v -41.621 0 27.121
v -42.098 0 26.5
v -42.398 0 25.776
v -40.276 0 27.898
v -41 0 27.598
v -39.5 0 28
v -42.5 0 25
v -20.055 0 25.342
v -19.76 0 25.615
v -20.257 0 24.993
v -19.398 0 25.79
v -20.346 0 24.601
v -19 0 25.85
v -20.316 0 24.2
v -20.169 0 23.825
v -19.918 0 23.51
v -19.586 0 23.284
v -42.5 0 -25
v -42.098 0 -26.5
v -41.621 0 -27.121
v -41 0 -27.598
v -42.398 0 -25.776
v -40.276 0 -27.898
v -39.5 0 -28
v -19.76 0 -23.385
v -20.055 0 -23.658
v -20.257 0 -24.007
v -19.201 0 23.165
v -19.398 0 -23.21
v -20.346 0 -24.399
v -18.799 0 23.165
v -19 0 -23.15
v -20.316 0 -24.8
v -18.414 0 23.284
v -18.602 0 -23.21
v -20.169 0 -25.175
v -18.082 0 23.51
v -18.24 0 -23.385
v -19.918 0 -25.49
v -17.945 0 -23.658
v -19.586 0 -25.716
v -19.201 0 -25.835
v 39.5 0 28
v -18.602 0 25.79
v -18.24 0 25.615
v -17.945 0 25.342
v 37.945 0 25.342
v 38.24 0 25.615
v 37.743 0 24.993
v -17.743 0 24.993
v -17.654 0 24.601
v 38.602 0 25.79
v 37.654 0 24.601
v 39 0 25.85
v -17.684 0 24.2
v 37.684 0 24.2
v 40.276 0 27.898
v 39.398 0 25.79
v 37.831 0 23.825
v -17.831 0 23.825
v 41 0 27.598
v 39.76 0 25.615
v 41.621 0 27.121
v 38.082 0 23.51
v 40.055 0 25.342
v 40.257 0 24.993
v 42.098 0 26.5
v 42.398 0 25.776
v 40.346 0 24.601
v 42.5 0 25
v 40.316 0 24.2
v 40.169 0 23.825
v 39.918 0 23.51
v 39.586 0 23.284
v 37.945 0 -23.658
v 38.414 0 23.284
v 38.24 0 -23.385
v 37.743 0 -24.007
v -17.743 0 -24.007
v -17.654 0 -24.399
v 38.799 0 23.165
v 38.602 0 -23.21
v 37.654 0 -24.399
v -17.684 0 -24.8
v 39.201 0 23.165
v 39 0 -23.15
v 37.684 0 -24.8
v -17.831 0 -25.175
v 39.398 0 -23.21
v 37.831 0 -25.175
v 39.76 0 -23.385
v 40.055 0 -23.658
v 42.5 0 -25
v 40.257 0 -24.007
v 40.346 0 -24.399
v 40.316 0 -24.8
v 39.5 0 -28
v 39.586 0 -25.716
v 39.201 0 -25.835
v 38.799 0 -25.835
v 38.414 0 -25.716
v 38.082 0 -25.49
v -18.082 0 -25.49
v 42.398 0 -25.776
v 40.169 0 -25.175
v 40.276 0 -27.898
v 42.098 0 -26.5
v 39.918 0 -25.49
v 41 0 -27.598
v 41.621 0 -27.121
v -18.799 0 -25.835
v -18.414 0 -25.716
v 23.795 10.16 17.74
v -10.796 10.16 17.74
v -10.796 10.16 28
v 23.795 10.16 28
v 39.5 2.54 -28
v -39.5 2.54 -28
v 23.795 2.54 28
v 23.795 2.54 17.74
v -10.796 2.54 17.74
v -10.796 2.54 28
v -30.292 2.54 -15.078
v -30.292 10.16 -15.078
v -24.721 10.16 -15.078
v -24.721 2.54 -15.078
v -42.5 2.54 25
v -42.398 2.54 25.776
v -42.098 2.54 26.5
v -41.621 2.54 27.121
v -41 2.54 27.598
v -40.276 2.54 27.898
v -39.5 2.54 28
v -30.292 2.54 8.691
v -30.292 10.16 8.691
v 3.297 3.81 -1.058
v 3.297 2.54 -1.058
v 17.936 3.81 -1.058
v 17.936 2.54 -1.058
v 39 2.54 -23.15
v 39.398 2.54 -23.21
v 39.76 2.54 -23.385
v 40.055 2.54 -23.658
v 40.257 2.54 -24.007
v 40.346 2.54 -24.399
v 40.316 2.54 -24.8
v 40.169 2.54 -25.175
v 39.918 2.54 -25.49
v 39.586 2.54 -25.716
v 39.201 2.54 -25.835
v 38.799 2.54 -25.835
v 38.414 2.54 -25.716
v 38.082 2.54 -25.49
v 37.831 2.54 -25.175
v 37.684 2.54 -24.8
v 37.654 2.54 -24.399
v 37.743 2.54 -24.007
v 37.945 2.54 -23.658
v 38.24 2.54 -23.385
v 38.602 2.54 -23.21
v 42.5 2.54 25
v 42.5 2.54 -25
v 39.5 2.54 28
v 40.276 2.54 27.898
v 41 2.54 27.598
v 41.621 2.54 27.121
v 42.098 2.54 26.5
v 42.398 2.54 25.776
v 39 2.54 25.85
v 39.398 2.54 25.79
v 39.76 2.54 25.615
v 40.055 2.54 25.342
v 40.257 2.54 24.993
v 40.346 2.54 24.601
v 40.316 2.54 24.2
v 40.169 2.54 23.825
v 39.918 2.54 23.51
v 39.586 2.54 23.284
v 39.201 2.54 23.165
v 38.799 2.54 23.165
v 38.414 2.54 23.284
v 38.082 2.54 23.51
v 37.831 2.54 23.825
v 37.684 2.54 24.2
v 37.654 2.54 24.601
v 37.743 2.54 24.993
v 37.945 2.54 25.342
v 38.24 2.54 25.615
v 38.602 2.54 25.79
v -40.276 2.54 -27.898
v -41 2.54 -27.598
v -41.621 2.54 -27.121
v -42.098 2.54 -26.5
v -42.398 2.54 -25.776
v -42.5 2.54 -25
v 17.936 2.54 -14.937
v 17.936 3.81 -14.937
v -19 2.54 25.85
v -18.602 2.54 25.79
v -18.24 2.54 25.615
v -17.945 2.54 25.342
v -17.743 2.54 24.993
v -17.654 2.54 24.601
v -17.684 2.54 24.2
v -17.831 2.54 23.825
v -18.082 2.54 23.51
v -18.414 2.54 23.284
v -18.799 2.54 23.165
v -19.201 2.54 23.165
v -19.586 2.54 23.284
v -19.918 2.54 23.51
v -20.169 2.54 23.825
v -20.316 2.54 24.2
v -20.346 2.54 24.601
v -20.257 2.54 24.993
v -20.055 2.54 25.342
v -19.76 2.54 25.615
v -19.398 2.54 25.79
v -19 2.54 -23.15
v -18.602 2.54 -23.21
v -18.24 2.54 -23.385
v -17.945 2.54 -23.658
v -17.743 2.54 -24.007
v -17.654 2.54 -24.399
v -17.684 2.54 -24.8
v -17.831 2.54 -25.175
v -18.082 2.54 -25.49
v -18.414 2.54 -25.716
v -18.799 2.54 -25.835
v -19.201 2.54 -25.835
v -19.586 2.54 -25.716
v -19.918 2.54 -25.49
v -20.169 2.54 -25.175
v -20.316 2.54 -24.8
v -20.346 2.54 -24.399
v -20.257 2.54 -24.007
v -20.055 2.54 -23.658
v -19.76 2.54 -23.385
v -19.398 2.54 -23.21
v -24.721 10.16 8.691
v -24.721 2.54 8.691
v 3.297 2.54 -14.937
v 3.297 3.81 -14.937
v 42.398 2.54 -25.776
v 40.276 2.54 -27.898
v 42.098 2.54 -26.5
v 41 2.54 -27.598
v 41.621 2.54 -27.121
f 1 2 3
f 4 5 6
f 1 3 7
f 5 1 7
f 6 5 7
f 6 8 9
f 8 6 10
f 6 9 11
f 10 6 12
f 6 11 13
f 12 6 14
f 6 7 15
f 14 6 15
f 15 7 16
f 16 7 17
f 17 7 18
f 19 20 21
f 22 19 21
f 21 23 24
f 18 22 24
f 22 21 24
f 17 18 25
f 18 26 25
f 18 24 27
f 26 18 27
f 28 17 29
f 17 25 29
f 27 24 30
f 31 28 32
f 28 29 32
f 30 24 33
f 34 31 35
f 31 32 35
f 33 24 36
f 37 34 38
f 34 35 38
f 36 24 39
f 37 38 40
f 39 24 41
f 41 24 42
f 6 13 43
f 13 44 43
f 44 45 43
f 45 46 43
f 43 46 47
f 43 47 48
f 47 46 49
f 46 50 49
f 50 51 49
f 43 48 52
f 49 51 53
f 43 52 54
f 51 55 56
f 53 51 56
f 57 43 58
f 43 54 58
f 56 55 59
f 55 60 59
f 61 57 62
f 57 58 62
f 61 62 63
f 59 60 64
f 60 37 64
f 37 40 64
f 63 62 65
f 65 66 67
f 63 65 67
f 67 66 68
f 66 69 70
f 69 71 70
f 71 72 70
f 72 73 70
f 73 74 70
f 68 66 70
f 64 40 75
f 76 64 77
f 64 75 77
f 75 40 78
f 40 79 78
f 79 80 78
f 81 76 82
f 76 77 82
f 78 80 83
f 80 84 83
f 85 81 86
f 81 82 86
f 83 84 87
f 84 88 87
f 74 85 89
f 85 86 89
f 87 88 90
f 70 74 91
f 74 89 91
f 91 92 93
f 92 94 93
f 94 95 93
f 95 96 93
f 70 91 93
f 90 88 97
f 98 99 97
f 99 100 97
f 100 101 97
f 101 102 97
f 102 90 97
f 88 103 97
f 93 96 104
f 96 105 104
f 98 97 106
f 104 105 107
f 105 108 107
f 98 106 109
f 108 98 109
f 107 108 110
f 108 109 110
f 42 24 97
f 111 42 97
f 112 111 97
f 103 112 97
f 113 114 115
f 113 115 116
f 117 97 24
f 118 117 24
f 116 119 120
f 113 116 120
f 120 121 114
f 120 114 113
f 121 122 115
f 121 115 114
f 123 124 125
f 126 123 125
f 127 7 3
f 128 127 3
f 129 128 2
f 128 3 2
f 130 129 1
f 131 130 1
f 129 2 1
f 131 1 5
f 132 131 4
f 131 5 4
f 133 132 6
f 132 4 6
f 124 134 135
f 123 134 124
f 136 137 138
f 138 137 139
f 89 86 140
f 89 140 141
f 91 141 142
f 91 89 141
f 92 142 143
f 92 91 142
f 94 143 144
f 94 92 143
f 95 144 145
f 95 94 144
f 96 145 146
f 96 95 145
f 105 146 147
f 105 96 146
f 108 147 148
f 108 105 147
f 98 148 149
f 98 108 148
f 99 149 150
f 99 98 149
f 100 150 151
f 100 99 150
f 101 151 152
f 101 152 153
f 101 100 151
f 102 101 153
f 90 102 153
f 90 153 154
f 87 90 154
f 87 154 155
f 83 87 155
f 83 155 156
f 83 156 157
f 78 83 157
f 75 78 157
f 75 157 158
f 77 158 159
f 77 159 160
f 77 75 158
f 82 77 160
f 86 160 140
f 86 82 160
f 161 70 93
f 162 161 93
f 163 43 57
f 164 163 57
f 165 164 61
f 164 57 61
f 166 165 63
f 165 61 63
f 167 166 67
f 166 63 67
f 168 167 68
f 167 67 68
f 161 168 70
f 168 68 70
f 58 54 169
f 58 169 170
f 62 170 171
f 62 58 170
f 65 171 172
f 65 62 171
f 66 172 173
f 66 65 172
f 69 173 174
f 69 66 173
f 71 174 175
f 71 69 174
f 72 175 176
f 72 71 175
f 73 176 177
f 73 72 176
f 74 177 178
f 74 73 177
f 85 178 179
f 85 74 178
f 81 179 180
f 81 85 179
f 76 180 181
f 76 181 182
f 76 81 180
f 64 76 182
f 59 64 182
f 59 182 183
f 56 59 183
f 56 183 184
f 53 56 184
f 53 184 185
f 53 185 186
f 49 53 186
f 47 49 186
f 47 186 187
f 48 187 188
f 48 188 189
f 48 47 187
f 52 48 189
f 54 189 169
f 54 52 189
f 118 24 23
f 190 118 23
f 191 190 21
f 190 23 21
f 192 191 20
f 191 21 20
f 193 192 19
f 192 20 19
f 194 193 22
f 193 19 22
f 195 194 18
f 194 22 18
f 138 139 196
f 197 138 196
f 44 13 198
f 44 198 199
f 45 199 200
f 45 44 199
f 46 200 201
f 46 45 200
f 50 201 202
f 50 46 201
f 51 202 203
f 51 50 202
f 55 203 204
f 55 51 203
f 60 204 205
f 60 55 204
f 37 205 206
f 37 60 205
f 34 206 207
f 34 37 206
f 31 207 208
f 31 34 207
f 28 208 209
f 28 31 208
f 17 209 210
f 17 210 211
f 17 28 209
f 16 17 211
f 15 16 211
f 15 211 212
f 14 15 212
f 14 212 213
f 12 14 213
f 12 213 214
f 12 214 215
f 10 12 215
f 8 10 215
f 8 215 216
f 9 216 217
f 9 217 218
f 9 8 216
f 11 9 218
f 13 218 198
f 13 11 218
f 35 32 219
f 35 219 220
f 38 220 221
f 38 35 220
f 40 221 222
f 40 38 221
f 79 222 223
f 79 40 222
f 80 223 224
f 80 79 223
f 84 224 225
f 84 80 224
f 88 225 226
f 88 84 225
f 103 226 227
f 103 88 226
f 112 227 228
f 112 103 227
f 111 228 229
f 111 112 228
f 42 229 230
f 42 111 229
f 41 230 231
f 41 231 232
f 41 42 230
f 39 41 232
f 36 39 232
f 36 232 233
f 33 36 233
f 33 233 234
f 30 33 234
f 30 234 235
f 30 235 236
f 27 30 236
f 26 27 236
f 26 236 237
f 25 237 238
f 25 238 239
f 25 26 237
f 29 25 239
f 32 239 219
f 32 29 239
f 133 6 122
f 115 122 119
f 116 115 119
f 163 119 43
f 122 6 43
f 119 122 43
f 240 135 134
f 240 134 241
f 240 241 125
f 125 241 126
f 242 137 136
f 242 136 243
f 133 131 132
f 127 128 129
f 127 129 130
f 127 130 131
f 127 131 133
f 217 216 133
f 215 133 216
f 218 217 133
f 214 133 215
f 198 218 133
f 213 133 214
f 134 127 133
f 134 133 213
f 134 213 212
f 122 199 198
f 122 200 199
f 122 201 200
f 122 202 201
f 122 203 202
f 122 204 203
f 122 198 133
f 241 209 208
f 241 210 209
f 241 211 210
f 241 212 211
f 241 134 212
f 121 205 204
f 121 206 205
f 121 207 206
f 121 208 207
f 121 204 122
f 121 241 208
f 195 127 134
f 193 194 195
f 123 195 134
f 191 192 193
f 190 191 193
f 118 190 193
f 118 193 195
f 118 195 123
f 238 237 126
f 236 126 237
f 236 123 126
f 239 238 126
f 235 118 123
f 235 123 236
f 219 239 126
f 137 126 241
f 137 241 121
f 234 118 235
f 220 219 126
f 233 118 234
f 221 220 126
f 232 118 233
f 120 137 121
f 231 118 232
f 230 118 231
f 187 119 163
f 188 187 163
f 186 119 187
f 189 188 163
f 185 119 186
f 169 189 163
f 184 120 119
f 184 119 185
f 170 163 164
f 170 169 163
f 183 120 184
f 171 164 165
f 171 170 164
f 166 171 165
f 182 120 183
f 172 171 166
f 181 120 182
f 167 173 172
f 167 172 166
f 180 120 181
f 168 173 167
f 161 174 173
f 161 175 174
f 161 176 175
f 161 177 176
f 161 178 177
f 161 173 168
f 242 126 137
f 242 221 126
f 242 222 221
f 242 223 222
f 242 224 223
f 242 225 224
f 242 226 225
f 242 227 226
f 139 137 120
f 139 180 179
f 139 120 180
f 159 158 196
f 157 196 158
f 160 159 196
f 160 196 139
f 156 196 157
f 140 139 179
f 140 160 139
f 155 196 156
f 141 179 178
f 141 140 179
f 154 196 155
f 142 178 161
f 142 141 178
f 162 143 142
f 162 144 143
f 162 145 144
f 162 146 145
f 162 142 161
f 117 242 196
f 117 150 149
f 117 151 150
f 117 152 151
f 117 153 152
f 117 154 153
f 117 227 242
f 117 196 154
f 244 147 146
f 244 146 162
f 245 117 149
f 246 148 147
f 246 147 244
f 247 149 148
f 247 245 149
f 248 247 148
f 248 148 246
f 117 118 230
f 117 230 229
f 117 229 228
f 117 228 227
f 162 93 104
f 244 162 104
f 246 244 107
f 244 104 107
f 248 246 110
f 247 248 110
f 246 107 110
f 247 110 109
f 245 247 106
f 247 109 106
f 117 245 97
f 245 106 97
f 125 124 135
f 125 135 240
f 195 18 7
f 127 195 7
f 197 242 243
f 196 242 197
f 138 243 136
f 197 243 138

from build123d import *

# Parameters (mm, degrees)
SKETCH1_R           = 1.35
BOSS_EXTRUDE1_DEPTH = 2.54
SKETCH2_W           = 34.5908584
SKETCH2_H           = 10.2596717
BOSS_EXTRUDE2_DEPTH = 7.62
SKETCH3_W           = 5.570985132
SKETCH3_H           = 23.769243549
BOSS_EXTRUDE3_DEPTH = 7.62
SKETCH4_W           = 14.639482868
SKETCH4_H           = 13.879415804
BOSS_EXTRUDE4_DEPTH = 1.27


with BuildPart() as part:
    # Sketch1 → Boss-Extrude1 (new body)
    with BuildSketch(Plane(origin=(0, 0, 0), x_dir=(1, 0, 0), z_dir=(0, 1, 0))):
        with BuildLine():
            ThreePointArc((42.5, 25.000002241), (41.621321, 27.121321), (39.500002241, 28))
            Line((39.500002241, 28), (-39.500002241, 28))
            ThreePointArc((-39.500002241, 28), (-41.621321, 27.121321), (-42.5, 25.000002241))
            Line((-42.5, 25.000002241), (-42.5, -25.000002241))
            ThreePointArc((-42.5, -25.000002241), (-41.621321, -27.121321), (-39.500002241, -28))
            Line((-39.500002241, -28), (39.500002241, -28))
            ThreePointArc((39.500002241, -28), (41.621321, -27.121321), (42.5, -25.000002241))
            Line((42.5, -25.000002241), (42.5, 25.000002241))
        make_face()
        with Locations((-19, -24.5)):
            Circle(SKETCH1_R, mode=Mode.SUBTRACT)
        with Locations((39, -24.5)):
            Circle(SKETCH1_R, mode=Mode.SUBTRACT)
        with Locations((-19, 24.5)):
            Circle(SKETCH1_R, mode=Mode.SUBTRACT)
        with Locations((39, 24.5)):
            Circle(SKETCH1_R, mode=Mode.SUBTRACT)
    extrude(amount=BOSS_EXTRUDE1_DEPTH)

    # Sketch2 → Boss-Extrude2 (add)
    with BuildSketch(Plane(origin=(0, 2.54, 0), x_dir=(1, 0, 0), z_dir=(0, 1, 0))):
        with Locations((6.499175034, -22.87016415)):
            Rectangle(SKETCH2_W, SKETCH2_H)
    extrude(amount=BOSS_EXTRUDE2_DEPTH)

    # Sketch3 → Boss-Extrude3 (add)
    with BuildSketch(Plane(origin=(0, 2.54, 0), x_dir=(1, 0, 0), z_dir=(0, 1, 0))):
        with Locations((-27.506444174, 3.193413678)):
            Rectangle(SKETCH3_W, SKETCH3_H)
    extrude(amount=BOSS_EXTRUDE3_DEPTH)

    # Sketch4 → Boss-Extrude4 (add)
    with BuildSketch(Plane(origin=(0, 2.54, 0), x_dir=(1, 0, 0), z_dir=(0, 1, 0))):
        with Locations((10.616389604, 7.997233107)):
            Rectangle(SKETCH4_W, SKETCH4_H)
    extrude(amount=BOSS_EXTRUDE4_DEPTH)


solid = part.part
